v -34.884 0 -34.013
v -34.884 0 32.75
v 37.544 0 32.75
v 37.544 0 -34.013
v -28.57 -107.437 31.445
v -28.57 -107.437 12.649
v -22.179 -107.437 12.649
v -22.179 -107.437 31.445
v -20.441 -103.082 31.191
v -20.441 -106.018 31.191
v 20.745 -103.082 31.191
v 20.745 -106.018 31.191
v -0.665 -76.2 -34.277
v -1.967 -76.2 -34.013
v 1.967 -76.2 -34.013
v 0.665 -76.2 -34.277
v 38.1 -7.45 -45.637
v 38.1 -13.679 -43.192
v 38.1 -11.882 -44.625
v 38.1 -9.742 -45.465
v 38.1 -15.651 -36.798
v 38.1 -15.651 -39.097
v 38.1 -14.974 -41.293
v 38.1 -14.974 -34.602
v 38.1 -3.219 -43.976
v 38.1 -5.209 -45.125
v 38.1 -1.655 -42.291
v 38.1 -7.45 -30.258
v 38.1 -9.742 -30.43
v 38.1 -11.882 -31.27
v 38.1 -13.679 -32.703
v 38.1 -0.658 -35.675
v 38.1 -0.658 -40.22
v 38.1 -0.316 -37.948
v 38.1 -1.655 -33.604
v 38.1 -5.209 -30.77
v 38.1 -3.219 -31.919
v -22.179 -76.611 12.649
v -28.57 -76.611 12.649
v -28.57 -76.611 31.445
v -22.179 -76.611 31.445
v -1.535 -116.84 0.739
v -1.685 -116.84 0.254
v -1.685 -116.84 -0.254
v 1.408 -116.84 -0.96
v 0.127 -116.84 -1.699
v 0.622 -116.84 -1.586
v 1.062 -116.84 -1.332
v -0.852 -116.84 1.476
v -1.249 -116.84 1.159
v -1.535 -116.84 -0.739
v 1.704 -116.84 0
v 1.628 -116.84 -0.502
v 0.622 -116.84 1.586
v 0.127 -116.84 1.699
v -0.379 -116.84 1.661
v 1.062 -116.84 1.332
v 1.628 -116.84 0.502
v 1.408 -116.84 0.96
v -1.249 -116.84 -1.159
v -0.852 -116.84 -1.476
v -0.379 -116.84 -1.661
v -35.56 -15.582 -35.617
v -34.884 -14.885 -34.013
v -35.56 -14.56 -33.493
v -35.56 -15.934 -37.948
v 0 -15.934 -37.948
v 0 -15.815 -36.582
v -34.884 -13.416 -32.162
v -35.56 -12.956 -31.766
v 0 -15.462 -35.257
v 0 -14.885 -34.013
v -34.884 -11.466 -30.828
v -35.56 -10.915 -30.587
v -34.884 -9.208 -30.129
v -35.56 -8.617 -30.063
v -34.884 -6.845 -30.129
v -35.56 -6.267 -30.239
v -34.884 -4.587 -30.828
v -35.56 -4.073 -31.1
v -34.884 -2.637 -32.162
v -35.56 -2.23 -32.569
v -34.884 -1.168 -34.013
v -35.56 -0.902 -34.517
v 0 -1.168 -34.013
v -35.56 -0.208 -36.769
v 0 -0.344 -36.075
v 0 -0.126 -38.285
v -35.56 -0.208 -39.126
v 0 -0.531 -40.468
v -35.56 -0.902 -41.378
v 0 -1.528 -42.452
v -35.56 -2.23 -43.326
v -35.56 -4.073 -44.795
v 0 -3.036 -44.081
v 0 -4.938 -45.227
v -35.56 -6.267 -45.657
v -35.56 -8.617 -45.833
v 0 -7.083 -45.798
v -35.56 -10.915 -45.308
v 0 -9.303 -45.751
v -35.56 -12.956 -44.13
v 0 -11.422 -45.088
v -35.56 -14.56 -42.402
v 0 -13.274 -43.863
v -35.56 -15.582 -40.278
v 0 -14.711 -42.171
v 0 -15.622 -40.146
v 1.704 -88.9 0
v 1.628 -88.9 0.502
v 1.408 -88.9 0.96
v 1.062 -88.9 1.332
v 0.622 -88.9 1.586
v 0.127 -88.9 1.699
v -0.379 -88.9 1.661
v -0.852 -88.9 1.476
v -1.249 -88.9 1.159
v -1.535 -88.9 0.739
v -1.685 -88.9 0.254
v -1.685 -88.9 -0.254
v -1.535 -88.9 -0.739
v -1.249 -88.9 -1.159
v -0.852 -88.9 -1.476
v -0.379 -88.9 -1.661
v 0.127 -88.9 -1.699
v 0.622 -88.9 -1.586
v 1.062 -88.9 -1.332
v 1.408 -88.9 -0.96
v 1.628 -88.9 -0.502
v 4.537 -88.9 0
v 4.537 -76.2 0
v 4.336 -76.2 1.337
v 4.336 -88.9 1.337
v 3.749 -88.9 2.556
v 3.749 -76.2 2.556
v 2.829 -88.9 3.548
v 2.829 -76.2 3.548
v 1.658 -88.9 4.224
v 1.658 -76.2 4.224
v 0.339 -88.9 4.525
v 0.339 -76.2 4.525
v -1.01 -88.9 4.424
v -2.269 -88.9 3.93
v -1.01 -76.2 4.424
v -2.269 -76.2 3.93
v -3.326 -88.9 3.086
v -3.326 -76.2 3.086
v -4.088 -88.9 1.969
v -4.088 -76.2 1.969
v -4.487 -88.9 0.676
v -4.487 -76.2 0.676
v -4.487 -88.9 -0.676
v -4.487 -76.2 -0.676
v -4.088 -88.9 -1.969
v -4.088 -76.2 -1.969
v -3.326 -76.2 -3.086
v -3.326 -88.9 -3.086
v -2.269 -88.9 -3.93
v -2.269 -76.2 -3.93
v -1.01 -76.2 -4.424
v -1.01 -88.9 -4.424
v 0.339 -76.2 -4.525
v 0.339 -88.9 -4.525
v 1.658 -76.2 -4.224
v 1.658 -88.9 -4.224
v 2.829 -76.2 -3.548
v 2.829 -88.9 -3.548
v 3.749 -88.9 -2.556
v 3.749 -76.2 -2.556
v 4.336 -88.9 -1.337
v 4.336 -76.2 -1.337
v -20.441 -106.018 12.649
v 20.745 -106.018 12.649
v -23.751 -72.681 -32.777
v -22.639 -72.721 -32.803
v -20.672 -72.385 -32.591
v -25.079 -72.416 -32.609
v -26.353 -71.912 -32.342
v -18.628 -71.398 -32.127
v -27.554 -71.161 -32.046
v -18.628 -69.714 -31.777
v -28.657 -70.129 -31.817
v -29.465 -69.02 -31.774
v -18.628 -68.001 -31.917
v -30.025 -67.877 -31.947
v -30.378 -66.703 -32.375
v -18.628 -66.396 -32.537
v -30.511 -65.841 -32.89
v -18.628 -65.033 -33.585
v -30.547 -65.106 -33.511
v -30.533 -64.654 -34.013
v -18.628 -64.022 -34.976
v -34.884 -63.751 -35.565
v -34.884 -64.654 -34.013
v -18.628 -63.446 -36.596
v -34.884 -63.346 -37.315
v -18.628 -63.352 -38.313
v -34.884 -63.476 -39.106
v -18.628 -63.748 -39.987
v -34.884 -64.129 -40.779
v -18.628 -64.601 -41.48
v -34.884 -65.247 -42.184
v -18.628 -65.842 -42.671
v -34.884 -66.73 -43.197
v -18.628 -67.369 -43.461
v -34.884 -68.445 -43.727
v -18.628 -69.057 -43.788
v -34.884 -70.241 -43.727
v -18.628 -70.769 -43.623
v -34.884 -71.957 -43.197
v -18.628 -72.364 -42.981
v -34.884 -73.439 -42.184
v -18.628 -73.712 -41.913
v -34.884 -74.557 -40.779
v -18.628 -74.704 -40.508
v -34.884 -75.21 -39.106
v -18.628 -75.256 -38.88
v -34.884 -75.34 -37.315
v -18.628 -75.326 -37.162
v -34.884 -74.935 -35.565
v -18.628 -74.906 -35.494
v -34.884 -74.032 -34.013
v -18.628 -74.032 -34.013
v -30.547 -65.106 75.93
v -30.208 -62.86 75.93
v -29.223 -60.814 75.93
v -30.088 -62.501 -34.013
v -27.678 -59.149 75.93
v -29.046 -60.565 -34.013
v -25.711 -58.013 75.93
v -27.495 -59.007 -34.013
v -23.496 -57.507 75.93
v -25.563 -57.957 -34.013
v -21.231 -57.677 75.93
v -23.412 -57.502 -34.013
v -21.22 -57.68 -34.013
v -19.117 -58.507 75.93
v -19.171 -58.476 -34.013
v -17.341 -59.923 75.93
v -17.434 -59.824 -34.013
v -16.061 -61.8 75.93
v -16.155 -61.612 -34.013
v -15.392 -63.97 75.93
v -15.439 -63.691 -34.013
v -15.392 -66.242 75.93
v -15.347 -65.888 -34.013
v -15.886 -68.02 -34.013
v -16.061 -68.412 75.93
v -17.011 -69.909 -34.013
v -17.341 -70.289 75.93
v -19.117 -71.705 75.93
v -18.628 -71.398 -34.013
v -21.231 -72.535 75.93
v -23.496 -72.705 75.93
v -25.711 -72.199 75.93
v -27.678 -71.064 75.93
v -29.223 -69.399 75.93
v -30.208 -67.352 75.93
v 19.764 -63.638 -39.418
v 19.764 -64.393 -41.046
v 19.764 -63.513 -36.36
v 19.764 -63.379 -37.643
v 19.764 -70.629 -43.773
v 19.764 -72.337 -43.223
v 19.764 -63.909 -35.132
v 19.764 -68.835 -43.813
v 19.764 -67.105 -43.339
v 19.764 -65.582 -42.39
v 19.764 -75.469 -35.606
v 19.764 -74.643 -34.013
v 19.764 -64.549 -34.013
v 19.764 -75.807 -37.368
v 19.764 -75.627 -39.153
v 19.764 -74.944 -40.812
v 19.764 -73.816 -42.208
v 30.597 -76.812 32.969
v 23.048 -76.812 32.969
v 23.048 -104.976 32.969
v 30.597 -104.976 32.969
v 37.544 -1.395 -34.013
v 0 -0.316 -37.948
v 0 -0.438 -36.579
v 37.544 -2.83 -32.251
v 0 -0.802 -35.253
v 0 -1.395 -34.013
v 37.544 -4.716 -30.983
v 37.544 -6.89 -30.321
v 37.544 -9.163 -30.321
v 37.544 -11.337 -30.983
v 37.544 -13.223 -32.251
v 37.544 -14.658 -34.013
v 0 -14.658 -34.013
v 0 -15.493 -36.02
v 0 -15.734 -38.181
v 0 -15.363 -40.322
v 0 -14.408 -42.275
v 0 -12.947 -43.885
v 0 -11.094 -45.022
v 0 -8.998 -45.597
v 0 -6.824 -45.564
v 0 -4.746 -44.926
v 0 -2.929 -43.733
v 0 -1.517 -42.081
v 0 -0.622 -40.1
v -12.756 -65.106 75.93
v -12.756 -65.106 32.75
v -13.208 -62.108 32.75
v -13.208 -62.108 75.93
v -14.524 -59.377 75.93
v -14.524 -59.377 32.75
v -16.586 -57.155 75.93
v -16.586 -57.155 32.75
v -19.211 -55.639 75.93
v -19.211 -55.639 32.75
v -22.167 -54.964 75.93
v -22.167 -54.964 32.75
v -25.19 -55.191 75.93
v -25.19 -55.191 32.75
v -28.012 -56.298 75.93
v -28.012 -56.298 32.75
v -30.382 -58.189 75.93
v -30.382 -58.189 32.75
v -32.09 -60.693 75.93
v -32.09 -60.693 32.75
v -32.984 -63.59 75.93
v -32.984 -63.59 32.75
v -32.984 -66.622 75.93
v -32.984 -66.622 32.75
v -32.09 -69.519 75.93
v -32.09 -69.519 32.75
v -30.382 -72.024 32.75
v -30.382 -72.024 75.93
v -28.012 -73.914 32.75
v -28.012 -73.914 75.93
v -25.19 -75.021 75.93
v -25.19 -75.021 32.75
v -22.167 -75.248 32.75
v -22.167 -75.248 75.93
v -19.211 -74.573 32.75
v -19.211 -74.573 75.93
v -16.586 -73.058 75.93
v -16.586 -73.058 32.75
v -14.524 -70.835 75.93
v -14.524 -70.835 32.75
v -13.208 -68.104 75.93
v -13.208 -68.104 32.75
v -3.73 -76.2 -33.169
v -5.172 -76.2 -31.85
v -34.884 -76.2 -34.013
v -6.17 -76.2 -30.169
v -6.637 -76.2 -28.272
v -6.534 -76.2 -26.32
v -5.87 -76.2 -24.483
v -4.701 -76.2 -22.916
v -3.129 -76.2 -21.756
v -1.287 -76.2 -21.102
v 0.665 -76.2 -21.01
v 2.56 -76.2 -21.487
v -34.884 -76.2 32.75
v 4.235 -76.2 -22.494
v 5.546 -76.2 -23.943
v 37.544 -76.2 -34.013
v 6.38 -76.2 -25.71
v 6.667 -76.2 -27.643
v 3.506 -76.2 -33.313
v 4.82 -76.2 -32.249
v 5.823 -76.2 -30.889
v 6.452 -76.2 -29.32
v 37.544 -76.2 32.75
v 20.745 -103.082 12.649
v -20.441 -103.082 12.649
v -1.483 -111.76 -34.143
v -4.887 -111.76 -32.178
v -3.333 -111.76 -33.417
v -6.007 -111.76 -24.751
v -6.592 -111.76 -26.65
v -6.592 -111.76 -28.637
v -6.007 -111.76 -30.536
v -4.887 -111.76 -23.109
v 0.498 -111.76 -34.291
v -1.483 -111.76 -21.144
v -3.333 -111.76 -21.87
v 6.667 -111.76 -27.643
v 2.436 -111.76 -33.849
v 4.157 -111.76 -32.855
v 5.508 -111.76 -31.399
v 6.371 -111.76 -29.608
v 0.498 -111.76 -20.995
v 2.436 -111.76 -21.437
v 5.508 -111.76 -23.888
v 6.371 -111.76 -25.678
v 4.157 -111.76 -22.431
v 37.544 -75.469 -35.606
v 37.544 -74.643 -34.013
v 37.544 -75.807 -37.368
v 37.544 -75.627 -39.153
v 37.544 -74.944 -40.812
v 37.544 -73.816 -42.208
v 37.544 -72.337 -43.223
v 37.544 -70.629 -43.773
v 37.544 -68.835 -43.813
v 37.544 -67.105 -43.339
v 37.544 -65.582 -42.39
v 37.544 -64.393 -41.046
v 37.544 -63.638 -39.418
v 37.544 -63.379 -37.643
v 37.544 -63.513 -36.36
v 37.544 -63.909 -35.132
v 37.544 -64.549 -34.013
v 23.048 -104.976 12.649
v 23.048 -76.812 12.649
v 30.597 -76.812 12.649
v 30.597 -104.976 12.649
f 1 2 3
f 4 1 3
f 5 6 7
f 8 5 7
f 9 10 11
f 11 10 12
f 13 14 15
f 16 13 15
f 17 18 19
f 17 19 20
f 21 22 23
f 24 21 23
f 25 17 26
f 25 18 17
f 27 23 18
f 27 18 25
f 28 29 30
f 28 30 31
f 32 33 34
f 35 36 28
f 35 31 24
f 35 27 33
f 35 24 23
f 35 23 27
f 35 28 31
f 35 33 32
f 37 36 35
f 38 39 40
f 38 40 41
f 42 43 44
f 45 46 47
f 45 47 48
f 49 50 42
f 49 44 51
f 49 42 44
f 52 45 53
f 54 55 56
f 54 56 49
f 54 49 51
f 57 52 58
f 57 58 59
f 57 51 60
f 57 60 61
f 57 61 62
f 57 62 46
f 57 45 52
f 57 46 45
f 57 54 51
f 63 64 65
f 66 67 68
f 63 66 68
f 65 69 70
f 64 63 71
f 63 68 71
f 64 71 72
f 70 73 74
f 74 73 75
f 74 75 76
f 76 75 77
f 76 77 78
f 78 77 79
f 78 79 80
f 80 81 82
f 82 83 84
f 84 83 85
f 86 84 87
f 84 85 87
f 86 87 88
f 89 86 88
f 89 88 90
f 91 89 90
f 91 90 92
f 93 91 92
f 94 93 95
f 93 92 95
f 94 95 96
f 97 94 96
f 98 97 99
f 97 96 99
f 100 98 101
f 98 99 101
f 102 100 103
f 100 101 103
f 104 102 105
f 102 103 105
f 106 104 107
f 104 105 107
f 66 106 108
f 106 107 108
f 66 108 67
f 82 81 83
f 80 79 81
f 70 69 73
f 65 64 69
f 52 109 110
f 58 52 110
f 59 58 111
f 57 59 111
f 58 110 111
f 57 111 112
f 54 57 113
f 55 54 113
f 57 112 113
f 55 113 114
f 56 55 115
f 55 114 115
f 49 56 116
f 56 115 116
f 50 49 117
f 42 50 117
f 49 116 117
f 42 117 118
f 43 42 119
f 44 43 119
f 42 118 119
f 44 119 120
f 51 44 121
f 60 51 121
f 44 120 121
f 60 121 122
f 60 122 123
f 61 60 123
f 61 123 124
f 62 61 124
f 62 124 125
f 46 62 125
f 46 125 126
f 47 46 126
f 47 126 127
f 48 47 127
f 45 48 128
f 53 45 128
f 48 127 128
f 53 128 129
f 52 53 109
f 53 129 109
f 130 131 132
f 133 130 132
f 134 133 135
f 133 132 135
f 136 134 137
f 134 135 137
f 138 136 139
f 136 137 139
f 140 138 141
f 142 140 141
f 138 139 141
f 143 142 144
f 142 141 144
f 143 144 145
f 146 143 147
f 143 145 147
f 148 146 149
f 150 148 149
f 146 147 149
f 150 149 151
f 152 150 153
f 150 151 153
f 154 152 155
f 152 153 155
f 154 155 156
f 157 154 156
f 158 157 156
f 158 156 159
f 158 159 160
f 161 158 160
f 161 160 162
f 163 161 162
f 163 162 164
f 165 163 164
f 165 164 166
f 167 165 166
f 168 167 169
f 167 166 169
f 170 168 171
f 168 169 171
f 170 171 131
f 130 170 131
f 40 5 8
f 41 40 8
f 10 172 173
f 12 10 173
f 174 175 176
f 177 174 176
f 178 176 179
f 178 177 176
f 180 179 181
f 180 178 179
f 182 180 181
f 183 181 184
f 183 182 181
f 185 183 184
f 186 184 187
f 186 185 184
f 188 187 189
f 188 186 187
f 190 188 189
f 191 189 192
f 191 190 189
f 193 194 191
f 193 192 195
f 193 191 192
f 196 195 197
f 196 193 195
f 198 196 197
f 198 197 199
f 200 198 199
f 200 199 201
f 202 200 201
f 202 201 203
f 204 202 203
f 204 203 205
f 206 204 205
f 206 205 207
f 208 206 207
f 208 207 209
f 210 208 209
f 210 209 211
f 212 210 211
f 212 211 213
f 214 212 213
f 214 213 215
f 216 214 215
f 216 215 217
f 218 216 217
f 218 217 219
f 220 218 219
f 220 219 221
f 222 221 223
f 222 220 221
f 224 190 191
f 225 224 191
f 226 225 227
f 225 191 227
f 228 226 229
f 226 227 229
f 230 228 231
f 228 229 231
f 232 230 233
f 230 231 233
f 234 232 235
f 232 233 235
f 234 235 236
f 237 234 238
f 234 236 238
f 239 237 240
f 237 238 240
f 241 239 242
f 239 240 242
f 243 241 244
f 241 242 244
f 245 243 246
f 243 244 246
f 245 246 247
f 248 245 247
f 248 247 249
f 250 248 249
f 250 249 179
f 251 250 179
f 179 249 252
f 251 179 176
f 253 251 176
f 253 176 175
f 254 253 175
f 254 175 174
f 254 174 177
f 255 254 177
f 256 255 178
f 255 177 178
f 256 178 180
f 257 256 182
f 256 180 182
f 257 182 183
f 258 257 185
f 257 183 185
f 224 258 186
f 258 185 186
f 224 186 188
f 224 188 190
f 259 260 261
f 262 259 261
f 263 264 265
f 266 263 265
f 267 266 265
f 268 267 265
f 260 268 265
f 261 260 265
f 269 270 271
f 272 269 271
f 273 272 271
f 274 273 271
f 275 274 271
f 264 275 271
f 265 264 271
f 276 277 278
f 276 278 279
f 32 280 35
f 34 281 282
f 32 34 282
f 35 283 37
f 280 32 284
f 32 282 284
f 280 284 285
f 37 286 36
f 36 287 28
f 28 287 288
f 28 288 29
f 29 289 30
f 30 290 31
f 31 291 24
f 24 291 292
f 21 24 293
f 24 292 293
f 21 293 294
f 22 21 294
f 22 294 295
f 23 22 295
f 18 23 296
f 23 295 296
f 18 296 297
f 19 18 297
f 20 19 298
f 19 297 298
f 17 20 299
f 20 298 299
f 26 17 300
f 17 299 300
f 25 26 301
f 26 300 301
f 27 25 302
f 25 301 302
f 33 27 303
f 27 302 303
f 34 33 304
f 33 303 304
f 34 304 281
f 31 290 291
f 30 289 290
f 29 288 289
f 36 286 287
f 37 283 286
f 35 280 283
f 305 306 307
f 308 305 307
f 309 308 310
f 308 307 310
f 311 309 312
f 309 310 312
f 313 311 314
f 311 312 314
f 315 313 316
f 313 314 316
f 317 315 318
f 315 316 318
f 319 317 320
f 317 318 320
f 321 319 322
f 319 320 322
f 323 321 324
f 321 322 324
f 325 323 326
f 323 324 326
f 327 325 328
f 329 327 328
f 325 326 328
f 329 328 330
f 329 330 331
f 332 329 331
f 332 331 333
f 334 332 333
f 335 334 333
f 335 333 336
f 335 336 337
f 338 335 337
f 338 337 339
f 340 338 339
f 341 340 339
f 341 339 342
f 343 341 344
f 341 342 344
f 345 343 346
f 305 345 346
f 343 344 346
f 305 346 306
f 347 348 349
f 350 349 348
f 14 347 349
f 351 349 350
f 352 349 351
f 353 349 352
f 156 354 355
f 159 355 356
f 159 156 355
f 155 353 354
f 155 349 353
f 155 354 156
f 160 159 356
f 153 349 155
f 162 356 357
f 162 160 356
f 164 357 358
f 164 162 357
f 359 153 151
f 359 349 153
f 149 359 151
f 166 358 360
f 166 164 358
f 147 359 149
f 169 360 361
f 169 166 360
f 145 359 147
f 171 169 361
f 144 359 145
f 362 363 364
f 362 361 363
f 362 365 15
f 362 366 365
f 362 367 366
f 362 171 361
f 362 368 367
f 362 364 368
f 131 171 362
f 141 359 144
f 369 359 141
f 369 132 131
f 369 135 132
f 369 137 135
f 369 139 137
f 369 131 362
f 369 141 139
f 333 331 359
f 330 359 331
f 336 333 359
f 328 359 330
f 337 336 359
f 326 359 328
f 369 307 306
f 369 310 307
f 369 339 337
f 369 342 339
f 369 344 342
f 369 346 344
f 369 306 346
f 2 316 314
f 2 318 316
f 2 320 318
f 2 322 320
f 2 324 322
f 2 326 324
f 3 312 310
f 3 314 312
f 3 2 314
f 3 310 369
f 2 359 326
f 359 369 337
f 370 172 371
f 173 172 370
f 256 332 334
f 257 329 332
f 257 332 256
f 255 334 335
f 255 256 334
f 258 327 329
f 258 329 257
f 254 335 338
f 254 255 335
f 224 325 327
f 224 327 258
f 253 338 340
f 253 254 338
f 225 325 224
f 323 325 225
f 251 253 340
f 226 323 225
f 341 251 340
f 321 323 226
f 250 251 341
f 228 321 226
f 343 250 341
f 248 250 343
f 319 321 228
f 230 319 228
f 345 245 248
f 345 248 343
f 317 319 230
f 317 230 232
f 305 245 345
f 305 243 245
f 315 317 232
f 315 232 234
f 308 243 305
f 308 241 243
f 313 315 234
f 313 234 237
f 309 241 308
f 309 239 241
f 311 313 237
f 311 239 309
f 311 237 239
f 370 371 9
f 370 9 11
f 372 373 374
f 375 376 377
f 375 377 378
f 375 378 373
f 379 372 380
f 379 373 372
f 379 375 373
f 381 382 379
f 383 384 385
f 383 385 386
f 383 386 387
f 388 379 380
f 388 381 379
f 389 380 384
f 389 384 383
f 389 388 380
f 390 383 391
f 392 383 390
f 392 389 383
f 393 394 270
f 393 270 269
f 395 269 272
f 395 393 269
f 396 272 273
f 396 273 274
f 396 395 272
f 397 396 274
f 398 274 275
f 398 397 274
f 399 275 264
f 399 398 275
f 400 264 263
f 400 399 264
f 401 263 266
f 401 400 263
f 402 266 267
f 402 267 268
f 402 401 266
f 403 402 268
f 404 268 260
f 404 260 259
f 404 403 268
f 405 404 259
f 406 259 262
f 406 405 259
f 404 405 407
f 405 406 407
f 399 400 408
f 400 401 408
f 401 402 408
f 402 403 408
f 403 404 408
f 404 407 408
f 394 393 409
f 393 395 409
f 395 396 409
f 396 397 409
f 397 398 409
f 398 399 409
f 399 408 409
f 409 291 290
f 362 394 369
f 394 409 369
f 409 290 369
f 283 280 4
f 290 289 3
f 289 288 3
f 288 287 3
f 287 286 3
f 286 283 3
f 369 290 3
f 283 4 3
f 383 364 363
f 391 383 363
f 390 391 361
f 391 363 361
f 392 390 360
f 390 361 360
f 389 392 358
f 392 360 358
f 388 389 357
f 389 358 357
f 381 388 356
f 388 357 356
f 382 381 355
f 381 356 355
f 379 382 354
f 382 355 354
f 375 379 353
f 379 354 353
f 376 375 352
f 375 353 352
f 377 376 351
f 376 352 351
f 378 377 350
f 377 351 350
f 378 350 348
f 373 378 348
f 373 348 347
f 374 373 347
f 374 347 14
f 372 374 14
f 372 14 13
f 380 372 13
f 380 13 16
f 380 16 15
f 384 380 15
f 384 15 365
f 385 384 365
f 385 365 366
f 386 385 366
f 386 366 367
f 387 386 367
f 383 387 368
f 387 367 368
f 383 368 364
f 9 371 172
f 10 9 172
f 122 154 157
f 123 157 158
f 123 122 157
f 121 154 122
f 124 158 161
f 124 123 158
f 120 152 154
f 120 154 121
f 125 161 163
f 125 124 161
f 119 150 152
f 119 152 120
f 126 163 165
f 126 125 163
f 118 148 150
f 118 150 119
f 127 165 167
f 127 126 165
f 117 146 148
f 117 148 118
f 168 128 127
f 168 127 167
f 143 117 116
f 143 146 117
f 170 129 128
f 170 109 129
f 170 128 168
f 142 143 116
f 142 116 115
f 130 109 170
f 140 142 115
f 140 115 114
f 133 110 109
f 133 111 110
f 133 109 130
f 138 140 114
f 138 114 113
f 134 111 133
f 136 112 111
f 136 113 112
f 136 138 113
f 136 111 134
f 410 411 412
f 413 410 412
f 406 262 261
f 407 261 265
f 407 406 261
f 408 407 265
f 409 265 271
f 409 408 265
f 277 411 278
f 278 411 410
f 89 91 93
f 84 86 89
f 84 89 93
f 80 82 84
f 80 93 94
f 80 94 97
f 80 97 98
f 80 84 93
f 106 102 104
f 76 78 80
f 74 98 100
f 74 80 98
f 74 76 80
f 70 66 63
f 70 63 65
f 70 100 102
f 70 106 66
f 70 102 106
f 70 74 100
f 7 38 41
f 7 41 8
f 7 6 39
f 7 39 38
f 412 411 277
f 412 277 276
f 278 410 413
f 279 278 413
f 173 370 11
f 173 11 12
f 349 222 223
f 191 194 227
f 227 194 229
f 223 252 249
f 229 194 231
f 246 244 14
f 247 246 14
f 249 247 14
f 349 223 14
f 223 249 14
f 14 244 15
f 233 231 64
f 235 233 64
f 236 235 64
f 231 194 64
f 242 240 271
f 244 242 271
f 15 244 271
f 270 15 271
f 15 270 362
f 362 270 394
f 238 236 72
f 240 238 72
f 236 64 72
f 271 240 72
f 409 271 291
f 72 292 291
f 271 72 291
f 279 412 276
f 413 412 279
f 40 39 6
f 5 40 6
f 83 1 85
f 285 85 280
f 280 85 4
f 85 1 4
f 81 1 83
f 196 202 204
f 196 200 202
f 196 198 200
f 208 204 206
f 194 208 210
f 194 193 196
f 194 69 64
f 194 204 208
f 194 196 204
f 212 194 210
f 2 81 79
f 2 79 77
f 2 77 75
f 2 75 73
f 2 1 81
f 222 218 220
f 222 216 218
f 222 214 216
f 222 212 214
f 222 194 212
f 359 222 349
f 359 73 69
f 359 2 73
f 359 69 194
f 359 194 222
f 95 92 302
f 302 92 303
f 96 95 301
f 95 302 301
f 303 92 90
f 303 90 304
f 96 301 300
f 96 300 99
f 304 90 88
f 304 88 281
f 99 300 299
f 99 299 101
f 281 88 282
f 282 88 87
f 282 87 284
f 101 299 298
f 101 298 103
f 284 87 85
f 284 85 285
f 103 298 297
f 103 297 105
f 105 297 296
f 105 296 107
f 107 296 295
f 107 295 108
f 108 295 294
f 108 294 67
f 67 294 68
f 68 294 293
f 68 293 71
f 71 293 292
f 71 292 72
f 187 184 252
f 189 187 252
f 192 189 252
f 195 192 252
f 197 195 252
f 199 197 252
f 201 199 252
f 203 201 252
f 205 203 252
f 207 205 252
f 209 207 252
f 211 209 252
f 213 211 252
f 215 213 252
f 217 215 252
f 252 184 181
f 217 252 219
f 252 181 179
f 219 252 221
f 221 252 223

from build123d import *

# Parameters (mm, degrees)
F0_W      = 72.4286958575
F0_H      = 66.7624995112
F1_DEPTH  = 76.2
F2_R      = 10.1703504115
F3_DEPTH  = 43.18
F4_R      = 6.6667791351
F5_DEPTH  = 35.56
F6_R      = 7.7108976591
F7_DEPTH  = 38.1
F8_R      = 7.9071951907
F9_DEPTH  = 35.56
F11_DEPTH = 17.78
F14_R     = 4.5374330057
F15_DEPTH = 12.7
F20_W     = 6.3906405121
F20_H     = 30.8254435658
F21_DEPTH = 18.796
F22_W     = 7.5489785522
F22_H     = 28.1635001302
F23_DEPTH = 20.32
F24_W     = 41.1858335137
F24_H     = 2.9357820749
F25_DEPTH = 18.542
F27_D     = 15.24
F28_R     = 6.0147196054
F29_DEPTH = 16.256
F30_R     = 1.7038843718
F31_DEPTH = 27.94


with BuildPart() as f1:
    # F0 (on Front) → F1 (new body)
    with BuildSketch(Plane.XZ):
        with Locations((1.3298764825, -0.6317384541)):
            Rectangle(F0_W, F0_H)
    extrude(amount=F1_DEPTH)

    # F2 (on face) → F3 (join)
    with BuildSketch(Plane.XY.offset(32.7495113015)):
        with Locations((-22.9268483818, -65.106138587)):
            Circle(F2_R)
    extrude(amount=F3_DEPTH)

    # F4 (on face) → F5 (join)
    with BuildSketch(Plane.XZ.offset(76.2)):
        with Locations((0, -27.6431385428)):
            Circle(F4_R)
    extrude(amount=F5_DEPTH)

    # F6 (on Right) → F7 (join)
    with BuildSketch(Plane.YZ):
        with Locations((-8.026397787, -37.9476025701)):
            Circle(F6_R)
    extrude(amount=F7_DEPTH)

    # F8 (on face) → F9 (join)
    with BuildSketch(Plane(origin=(0, 0, 0), x_dir=(0, -1, 0), z_dir=(-1, 0, 0))):
        with Locations((8.026397787, -37.9476025701)):
            Circle(F8_R)
    extrude(amount=F9_DEPTH)

    # F10 (on face) → F11 (join)
    with BuildSketch(Plane.YZ.offset(37.5442244112)):
        with BuildLine():
            ThreePointArc((-74.6429898938, -34.0129882097), (-71.5028168985, -43.5598665716), (-63.3792777676, -37.6427993178))
            ThreePointArc((-63.3792777676, -37.6427993178), (-63.678932762, -35.735982435), (-64.5490101377, -34.0129882097))
            Line((-64.5490101377, -34.0129882097), (-74.6429898938, -34.0129882097))
        make_face()
    extrude(amount=-F11_DEPTH)

    # F14 (on face) → F15 (join)
    with BuildSketch(Plane.XZ.offset(76.2)):
        Circle(F14_R)
    extrude(amount=F15_DEPTH)

    # F27 (through all)
    with Locations(Plane.XY.offset(75.9295113015)):
        with Locations((-22.9268483818, -65.106138587)):
            Hole(F27_D / 2)

    # F28 (on face) → F29 (join)
    with BuildSketch(Plane(origin=(-34.8844714463, 0, 0), x_dir=(0, -1, 0), z_dir=(-1, 0, 0))):
        with Locations((69.3431347609, -37.7799607813)):
            Circle(F28_R)
    extrude(amount=-F29_DEPTH)

    # F30 (on face) → F31 (join)
    with BuildSketch(Plane.XZ.offset(88.9)):
        Circle(F30_R)
    extrude(amount=F31_DEPTH)


with BuildPart() as f21:
    # F20 (on face) → F21 (new body)
    with BuildSketch(Plane(origin=(0, 0, 12.6491999254), x_dir=(1, 0, 0), z_dir=(0, 0, -1))):
        with Locations((-25.3745997325, 92.0241959393)):
            Rectangle(F20_W, F20_H)
    extrude(amount=-F21_DEPTH)


with BuildPart() as f23:
    # F22 (on face) → F23 (new body)
    with BuildSketch(Plane(origin=(0, 0, 12.6491999254), x_dir=(1, 0, 0), z_dir=(0, 0, -1))):
        with Locations((26.8225362524, 90.8939503133)):
            Rectangle(F22_W, F22_H)
    extrude(amount=-F23_DEPTH)


with BuildPart() as f25:
    # F24 (on face) → F25 (new body)
    with BuildSketch(Plane(origin=(0, 0, 12.6491999254), x_dir=(1, 0, 0), z_dir=(0, 0, -1))):
        with Locations((0.1522358507, 104.5498177409)):
            Rectangle(F24_W, F24_H)
    extrude(amount=-F25_DEPTH)


solid = Compound([f1.part, f21.part, f23.part, f25.part])
